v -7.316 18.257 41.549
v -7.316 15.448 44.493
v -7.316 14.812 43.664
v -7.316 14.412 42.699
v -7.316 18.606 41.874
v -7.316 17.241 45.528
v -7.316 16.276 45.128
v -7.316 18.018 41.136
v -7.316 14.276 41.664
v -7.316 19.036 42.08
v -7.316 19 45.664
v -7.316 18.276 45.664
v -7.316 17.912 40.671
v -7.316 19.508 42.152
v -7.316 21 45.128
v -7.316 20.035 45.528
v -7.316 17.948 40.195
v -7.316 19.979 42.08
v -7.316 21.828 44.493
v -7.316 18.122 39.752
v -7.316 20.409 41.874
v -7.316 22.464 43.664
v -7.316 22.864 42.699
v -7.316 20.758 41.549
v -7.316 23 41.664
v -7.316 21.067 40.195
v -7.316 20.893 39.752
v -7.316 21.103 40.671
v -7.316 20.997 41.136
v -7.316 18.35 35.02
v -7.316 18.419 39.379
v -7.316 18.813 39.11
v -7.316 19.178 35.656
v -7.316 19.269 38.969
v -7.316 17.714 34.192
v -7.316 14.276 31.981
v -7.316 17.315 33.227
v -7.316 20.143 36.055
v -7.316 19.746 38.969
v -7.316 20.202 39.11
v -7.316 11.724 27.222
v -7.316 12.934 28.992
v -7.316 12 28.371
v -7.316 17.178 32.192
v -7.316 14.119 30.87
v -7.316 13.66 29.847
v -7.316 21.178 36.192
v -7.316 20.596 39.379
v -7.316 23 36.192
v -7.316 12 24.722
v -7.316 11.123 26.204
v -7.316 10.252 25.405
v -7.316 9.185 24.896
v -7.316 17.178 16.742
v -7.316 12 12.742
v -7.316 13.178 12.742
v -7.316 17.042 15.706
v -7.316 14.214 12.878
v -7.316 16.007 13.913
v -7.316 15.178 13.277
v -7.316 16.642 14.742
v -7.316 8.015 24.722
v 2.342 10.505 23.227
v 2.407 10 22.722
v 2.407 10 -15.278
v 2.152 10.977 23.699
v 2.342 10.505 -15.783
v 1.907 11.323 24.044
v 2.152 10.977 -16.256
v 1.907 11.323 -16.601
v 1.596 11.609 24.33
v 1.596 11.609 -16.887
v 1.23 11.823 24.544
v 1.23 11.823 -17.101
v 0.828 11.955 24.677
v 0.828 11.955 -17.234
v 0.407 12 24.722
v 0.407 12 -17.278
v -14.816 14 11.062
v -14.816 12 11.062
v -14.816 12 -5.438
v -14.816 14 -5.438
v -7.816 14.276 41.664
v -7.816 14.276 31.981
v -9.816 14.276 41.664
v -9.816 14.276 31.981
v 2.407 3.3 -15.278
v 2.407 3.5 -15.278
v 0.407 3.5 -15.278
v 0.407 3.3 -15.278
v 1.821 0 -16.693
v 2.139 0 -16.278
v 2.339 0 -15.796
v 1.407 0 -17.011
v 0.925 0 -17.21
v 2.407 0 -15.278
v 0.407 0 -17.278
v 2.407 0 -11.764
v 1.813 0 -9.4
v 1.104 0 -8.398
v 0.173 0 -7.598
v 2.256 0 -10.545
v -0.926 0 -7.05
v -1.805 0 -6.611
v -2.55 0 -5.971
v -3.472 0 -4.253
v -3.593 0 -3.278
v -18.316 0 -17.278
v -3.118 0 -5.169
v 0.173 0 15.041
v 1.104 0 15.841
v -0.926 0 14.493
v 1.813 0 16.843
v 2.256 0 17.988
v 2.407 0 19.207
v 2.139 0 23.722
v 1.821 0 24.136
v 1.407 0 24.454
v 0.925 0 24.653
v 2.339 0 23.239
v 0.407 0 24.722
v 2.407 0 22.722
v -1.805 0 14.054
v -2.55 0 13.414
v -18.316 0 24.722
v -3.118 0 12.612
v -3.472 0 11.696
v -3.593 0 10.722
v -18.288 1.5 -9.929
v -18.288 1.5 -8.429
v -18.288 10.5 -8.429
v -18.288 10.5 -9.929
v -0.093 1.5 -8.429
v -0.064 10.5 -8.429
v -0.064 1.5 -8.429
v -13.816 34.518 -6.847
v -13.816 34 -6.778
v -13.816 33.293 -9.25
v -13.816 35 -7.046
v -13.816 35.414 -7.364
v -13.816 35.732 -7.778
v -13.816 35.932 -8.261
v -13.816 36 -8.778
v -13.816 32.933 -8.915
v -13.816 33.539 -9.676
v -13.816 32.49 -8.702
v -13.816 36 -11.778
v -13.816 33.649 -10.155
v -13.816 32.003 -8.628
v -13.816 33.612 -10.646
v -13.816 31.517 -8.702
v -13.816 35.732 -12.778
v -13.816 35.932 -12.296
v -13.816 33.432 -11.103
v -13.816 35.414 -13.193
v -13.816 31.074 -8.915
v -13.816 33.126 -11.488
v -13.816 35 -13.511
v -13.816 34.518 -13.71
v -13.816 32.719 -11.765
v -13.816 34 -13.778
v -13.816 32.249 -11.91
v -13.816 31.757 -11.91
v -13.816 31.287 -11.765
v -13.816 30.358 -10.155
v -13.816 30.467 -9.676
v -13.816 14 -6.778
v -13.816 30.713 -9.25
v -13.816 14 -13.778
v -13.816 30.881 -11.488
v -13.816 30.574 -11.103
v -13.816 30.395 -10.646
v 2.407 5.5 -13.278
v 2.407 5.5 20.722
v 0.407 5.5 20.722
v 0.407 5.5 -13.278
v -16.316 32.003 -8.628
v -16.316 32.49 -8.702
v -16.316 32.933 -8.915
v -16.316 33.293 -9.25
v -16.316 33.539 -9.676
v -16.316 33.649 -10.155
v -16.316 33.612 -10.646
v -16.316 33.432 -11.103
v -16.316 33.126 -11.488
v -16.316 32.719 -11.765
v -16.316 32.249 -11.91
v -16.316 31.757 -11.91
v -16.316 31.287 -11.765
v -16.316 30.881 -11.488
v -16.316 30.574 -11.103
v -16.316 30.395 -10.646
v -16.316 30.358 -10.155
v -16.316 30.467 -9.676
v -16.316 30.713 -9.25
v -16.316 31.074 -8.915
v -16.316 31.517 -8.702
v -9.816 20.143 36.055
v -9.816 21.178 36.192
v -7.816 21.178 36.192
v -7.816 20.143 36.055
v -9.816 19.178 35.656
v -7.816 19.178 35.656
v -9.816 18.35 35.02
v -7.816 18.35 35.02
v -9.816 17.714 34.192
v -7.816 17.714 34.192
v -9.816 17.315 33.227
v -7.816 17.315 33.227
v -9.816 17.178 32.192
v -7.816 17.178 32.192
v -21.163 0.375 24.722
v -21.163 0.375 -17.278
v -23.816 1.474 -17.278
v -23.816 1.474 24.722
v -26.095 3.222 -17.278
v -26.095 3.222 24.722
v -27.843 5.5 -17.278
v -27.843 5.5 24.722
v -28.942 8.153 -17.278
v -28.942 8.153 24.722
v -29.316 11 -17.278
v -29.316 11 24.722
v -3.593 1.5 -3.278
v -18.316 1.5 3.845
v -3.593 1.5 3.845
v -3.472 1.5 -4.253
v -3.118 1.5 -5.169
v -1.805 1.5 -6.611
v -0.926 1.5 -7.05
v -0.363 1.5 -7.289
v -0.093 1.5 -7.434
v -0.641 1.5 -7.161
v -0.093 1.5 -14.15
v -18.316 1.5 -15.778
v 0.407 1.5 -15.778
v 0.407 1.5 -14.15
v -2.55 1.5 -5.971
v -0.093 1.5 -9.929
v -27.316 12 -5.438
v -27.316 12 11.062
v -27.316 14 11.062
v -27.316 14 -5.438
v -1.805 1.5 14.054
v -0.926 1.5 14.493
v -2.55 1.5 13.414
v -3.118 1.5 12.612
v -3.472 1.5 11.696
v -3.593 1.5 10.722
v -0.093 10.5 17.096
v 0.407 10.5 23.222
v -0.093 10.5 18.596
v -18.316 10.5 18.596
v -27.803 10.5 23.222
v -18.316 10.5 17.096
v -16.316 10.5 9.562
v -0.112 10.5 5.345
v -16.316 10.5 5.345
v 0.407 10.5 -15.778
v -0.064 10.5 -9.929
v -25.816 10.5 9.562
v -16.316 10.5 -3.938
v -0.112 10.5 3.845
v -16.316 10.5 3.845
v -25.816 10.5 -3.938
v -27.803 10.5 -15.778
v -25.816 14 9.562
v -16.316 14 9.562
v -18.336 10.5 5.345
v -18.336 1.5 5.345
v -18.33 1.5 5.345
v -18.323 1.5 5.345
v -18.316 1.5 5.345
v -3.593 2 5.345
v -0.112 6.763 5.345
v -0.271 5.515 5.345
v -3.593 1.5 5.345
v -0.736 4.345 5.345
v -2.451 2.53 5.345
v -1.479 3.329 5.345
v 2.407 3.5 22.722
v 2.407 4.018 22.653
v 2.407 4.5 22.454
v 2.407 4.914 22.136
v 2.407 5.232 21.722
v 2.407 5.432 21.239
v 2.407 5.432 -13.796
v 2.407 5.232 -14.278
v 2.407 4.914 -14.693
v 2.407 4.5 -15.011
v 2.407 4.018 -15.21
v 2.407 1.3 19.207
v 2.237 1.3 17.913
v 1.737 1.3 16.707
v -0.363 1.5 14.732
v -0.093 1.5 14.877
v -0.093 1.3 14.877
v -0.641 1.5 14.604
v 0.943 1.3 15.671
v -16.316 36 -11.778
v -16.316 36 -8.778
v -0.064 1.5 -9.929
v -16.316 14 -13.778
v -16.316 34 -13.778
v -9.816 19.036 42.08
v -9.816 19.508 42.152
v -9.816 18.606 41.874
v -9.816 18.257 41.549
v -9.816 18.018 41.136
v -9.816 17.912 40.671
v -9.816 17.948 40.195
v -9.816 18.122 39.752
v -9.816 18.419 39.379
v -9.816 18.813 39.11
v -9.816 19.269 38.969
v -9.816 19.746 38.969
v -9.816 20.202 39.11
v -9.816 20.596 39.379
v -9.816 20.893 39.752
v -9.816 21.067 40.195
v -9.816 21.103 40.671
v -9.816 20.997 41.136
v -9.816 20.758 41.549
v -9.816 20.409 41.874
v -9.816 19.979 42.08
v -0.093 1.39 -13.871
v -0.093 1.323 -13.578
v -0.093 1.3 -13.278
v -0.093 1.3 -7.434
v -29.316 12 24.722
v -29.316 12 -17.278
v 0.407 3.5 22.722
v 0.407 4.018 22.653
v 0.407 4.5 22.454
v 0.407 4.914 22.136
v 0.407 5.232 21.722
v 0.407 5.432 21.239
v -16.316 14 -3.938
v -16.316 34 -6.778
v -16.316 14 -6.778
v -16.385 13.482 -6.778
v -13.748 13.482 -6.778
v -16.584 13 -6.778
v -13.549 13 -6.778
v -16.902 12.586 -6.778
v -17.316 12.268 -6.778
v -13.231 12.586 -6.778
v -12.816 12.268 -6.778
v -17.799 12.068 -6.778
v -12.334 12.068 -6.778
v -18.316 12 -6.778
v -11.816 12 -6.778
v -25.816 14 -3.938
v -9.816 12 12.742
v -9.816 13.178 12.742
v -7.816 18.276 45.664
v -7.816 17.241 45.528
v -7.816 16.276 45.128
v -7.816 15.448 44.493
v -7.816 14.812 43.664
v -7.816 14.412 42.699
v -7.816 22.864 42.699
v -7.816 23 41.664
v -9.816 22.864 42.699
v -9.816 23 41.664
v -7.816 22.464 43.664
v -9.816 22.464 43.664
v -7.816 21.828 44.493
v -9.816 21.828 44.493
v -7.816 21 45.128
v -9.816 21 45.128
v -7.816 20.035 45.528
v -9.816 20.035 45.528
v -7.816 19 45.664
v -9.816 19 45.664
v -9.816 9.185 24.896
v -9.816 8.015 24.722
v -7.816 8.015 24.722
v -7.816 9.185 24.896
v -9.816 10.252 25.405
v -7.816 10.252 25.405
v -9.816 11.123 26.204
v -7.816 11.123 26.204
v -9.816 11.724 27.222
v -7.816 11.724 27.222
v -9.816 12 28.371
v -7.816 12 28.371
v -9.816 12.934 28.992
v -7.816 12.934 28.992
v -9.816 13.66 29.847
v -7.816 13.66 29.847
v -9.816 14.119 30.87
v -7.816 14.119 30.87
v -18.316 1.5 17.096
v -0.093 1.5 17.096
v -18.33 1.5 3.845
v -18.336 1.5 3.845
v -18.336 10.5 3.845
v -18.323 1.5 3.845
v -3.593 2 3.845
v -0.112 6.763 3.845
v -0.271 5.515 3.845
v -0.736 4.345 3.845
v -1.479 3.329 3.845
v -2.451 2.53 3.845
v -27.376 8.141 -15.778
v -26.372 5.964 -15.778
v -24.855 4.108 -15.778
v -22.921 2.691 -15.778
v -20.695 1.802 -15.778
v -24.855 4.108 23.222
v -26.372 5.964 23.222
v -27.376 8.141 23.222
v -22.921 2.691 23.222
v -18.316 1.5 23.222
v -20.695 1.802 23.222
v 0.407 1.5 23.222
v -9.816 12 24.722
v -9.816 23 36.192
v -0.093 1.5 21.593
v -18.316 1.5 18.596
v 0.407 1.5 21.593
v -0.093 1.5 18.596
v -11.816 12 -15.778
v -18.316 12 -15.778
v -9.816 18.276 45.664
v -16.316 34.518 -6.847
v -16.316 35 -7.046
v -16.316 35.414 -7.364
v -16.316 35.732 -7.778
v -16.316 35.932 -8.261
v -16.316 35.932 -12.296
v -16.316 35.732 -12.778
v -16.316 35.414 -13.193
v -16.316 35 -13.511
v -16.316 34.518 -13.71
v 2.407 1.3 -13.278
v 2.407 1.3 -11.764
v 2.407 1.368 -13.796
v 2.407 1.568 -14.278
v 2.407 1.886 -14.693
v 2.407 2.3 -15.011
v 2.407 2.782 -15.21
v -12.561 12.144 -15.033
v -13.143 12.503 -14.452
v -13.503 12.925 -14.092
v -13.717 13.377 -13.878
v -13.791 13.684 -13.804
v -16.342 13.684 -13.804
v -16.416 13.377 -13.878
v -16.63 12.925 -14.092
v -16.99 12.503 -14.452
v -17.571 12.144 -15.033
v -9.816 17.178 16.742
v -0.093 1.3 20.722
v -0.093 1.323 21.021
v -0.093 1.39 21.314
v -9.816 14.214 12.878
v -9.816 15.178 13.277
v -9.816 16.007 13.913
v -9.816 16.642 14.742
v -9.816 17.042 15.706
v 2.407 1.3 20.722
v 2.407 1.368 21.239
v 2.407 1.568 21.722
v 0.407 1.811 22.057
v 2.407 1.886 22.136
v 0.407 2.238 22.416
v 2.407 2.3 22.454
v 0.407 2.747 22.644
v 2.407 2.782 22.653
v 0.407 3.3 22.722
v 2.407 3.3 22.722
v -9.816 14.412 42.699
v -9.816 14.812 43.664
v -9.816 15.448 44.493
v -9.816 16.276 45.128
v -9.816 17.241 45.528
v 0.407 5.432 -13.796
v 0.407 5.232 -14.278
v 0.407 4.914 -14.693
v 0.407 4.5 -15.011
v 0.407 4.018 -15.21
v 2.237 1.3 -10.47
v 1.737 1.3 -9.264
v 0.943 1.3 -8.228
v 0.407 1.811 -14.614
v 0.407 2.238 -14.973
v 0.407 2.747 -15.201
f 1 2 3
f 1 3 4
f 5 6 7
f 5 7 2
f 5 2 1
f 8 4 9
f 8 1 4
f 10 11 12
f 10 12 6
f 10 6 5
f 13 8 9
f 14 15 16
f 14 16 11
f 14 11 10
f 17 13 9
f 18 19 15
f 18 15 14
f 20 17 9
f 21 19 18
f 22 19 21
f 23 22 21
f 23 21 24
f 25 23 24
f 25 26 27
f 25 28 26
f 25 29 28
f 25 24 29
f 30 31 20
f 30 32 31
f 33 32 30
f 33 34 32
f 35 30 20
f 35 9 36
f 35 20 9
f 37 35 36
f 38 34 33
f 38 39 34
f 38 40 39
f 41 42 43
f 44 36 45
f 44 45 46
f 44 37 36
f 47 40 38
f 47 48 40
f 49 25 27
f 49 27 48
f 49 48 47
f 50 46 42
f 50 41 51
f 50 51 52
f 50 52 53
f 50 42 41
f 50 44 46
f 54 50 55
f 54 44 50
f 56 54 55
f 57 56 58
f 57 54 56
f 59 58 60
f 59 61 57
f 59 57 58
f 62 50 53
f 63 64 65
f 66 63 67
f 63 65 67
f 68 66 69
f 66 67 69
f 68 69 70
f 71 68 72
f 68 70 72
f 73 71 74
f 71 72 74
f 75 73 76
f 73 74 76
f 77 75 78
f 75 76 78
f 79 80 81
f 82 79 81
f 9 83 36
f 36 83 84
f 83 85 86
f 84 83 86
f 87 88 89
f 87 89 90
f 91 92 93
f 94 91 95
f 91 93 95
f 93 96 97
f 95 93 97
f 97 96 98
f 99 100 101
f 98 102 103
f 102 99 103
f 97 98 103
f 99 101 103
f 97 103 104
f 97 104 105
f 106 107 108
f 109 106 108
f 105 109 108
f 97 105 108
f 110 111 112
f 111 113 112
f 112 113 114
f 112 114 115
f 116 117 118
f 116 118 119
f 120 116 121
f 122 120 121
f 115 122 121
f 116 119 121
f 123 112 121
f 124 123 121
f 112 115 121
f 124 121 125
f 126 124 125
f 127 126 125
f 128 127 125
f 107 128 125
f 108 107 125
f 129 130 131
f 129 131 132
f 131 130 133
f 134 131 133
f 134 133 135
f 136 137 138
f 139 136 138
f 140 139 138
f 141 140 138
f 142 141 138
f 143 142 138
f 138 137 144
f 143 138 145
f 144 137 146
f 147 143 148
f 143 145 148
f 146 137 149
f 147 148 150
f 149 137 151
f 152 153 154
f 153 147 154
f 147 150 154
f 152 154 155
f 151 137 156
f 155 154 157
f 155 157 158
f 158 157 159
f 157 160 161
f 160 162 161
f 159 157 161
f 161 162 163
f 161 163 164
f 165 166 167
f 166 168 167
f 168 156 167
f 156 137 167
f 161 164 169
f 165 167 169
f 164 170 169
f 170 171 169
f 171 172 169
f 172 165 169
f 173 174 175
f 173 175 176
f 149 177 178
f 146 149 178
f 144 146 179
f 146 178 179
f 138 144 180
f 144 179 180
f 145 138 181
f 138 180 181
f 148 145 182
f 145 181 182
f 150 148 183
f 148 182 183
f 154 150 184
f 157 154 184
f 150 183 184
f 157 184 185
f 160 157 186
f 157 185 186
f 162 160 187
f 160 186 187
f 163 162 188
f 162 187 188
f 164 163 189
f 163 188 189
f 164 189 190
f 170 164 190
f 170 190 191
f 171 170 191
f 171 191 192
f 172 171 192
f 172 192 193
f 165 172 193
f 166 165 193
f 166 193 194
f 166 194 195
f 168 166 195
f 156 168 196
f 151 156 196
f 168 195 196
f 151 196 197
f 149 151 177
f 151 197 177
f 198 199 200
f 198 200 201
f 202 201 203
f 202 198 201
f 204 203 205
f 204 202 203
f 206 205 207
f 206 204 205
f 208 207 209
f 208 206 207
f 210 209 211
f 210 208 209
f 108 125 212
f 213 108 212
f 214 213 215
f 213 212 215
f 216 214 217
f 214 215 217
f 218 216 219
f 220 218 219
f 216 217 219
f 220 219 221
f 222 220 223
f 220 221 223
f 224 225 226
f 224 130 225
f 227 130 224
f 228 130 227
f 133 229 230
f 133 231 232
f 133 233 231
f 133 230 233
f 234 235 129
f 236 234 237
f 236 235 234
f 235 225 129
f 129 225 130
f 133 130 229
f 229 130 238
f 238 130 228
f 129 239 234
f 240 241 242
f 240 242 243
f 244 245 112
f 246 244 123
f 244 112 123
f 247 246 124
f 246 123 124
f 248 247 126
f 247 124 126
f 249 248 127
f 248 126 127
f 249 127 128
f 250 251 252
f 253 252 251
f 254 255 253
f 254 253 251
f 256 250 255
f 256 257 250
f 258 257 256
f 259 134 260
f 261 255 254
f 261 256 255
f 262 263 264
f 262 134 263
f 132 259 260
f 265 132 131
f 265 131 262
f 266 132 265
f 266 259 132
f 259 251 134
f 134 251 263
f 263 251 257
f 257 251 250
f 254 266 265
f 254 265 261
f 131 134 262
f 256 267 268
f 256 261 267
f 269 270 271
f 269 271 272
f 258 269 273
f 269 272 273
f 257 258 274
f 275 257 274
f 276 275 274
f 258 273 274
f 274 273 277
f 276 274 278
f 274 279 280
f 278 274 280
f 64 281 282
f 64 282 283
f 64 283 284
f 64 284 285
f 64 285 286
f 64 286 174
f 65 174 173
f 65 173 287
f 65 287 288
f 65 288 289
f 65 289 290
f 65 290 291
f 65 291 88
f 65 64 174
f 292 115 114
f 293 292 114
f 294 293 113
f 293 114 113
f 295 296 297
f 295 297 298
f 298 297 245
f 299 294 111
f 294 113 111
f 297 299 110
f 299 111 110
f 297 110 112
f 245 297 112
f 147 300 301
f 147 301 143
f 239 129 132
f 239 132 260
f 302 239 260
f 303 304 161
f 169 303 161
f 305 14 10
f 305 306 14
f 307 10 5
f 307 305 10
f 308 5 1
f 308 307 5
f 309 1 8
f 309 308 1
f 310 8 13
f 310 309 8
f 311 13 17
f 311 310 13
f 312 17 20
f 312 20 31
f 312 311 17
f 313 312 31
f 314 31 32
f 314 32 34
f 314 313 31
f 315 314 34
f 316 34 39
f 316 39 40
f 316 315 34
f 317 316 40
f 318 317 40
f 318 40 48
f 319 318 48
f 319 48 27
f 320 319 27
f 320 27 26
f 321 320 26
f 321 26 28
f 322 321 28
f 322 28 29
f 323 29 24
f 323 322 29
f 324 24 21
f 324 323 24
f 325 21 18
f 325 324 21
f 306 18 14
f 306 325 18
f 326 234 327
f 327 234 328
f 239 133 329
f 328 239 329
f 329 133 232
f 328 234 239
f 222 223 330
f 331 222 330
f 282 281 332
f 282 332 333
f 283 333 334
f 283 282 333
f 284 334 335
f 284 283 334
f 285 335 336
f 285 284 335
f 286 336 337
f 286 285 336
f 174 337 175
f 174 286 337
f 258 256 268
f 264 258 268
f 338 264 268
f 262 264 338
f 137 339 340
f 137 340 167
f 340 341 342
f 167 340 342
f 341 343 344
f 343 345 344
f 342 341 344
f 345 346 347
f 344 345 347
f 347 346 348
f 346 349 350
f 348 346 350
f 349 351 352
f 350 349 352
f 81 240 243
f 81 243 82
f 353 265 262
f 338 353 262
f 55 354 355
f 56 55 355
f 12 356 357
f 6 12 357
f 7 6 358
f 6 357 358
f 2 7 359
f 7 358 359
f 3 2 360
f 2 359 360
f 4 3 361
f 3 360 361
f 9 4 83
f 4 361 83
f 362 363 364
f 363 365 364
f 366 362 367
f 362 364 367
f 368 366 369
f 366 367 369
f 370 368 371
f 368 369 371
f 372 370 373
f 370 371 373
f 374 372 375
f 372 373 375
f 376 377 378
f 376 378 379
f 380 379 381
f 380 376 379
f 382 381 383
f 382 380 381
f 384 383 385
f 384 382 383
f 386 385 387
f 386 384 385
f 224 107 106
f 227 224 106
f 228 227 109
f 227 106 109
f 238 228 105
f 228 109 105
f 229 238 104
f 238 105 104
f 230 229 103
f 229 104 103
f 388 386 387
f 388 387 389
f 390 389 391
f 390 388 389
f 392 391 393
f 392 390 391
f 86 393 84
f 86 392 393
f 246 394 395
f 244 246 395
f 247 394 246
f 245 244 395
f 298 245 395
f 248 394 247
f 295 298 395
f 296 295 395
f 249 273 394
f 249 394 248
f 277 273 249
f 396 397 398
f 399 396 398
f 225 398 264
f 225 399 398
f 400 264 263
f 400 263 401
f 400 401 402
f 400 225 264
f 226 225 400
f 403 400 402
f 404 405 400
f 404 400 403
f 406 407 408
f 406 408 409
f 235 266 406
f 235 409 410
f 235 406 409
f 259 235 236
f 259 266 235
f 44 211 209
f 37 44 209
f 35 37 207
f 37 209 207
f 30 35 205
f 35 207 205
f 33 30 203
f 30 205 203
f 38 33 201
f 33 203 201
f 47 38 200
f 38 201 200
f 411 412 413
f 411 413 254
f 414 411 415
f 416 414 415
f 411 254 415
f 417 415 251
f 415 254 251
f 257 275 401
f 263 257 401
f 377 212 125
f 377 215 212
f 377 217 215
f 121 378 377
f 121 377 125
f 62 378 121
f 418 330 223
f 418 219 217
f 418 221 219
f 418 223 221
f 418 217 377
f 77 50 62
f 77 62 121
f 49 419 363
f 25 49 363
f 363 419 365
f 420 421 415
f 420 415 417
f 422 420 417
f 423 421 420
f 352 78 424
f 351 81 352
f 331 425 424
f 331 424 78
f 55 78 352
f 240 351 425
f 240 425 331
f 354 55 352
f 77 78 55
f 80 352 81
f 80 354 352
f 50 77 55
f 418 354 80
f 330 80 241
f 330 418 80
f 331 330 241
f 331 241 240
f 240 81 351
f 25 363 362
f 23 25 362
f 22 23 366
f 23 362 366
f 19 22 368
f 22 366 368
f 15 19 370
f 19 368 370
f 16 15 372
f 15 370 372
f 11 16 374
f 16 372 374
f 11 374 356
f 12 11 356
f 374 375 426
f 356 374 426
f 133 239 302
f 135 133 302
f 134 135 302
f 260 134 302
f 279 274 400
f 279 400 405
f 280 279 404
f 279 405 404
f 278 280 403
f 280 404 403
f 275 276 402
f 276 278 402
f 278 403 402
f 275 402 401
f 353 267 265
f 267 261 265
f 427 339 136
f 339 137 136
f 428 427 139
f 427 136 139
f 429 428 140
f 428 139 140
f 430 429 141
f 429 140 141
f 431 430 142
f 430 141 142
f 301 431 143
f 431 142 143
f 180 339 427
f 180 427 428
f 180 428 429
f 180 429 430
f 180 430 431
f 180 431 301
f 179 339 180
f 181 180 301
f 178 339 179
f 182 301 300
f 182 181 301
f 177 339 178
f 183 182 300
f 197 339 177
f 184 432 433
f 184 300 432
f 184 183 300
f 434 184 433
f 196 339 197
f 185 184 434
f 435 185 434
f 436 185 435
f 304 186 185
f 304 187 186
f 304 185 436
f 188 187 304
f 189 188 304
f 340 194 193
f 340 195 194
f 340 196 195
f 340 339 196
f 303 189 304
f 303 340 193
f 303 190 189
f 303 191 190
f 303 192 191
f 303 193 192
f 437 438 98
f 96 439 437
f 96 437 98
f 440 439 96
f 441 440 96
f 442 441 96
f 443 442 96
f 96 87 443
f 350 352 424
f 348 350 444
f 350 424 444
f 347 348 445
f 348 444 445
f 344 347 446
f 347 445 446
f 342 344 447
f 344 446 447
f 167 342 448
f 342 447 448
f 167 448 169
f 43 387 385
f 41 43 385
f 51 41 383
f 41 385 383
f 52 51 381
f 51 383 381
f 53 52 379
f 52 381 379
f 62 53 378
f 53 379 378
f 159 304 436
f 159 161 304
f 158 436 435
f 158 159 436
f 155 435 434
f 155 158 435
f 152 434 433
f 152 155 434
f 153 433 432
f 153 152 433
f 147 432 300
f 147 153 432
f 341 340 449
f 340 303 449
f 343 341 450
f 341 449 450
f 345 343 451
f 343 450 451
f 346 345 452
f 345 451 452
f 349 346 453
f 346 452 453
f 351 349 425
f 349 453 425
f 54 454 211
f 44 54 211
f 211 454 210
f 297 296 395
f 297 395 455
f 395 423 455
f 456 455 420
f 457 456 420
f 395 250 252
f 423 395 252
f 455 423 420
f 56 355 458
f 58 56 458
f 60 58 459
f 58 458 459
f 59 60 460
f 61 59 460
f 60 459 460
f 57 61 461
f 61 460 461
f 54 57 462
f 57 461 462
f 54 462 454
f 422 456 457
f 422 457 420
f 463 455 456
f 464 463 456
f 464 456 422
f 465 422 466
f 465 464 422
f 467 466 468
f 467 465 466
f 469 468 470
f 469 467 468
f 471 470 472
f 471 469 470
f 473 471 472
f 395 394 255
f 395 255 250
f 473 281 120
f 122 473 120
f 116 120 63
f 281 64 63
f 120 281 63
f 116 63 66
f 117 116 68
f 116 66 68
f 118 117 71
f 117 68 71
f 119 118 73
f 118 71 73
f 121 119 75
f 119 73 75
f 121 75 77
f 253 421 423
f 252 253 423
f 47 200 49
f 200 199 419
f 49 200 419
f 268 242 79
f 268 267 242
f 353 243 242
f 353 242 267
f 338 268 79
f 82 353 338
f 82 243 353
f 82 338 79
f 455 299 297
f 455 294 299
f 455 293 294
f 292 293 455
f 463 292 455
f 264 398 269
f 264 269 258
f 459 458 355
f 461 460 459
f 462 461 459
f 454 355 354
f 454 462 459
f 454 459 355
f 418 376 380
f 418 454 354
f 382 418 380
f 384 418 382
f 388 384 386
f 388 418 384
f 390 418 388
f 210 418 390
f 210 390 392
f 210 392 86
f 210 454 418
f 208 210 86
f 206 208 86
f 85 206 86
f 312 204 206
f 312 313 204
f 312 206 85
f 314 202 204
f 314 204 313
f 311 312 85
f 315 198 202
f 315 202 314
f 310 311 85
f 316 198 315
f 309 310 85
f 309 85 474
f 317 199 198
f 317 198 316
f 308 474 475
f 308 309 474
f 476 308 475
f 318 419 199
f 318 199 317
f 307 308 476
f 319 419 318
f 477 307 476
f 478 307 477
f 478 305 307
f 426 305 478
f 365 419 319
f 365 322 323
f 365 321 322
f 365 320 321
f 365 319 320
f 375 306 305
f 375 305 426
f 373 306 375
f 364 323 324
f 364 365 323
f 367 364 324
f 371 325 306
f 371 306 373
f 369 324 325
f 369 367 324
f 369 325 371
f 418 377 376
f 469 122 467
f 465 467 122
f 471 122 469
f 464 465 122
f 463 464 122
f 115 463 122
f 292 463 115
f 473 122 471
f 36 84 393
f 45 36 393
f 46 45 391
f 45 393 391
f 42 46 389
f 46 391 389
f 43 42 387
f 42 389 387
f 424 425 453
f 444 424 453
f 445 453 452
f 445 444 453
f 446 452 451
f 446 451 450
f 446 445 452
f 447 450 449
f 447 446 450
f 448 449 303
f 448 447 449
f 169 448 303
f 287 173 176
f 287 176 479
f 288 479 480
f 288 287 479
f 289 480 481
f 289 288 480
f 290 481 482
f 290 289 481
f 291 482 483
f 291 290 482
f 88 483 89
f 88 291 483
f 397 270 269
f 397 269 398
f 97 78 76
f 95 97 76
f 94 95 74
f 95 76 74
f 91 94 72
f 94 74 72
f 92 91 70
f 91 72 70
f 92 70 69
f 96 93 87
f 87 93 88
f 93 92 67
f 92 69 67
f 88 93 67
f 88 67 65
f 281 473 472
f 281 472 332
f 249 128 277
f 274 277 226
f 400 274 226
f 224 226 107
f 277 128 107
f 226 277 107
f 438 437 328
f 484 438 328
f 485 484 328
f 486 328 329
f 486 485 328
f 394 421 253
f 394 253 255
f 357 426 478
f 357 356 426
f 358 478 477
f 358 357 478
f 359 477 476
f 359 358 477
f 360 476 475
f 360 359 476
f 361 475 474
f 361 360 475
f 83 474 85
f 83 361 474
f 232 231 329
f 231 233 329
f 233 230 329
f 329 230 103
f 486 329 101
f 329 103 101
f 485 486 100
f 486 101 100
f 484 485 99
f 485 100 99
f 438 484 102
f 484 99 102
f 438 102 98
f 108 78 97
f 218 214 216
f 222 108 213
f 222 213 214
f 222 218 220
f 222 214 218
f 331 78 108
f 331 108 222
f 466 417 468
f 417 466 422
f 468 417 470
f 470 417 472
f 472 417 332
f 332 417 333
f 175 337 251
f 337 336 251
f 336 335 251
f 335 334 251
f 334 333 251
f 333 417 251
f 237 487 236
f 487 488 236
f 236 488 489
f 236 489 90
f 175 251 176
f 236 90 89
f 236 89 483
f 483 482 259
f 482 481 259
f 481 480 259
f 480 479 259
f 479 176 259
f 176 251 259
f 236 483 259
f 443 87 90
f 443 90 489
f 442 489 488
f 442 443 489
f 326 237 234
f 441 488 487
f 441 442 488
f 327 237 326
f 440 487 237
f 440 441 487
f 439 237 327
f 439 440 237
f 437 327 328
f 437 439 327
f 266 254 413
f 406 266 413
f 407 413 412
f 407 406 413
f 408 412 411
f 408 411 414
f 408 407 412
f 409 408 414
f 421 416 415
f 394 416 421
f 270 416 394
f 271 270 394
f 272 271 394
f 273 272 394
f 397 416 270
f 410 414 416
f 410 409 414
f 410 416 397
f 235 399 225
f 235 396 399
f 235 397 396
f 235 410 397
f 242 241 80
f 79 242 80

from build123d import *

# Parameters (mm, degrees)
SALIENTE_EXTRUIR1_DEPTH  = 12
CROQUIS2_W               = 12.5
CROQUIS2_H               = 16.5
CROQUIS2_W_2             = 9.5
CROQUIS2_H_2             = 13.5
SALIENTE_EXTRUIR2_DEPTH  = 2
SALIENTE_EXTRUIR4_DEPTH  = 11
CROQUIS4_R               = 1.6
CORTAR_EXTRUIR1_DEPTH    = 2.5
CROQUIS5_W               = 17.29289048
CROQUIS5_H               = 2.276098228
CROQUIS5_W_2             = 23.449996424
CROQUIS5_H_2             = 5.821617307
CORTAR_EXTRUIR2_DEPTH    = 2
SALIENTE_EXTRUIR5_DEPTH  = 3
CROQUIS7_W               = 60
CROQUIS7_H               = 12
SALIENTE_EXTRUIR6_DEPTH  = 3
CORTAR_EXTRUIR3_DEPTH    = 42
VACIADO4_START           = -15.778481013
VACIADO4_DEPTH           = 39
VACIADO4_2_OUTLINE_W     = 28
VACIADO4_2_OUTLINE_H     = 9
VACIADO4_2_DEPTH         = 4
VACIADO4_START_2         = 19.221518987
VACIADO4_3_OUTLINE_W     = 28
VACIADO4_3_OUTLINE_H     = 9
VACIADO4_3_DEPTH         = 4
VACIADO4_START_3         = -3.938481013
VACIADO4_4_OUTLINE_W     = 9.5
VACIADO4_4_OUTLINE_H     = 1.5
VACIADO4_4_DEPTH         = 13.5
REDONDEO2_R              = 4
REDONDEO3_R              = 4
CROQUIS10_W              = 2.5
CROQUIS10_H              = 7
SALIENTE_EXTRUIR8_DEPTH  = 24
CROQUIS11_R              = 1.65
CORTAR_EXTRUIR4_DEPTH    = 2.5
CROQUIS14_R              = 1.6
SALIENTE_EXTRUIR10_DEPTH = 0.5
CROQUIS15_W              = 28.276285021
CROQUIS15_H              = 42
CORTAR_EXTRUIR5_DEPTH    = 12
CROQUIS16_W              = 42
CROQUIS16_H              = 12
SALIENTE_EXTRUIR11_DEPTH = 2
CORTAR_EXTRUIR6_DEPTH    = 2.5
CROQUIS19_W              = 18.223714979
CROQUIS19_H              = 1.5
SALIENTE_EXTRUIR16_DEPTH = 9
REDONDEO4_R              = 2
REDONDEO5_R              = 2
REDONDEO6_R              = 2
CORTAR_EXTRUIR7_DEPTH    = 2
REDONDEO7_R              = 5
REDONDEO8_R              = 5


with BuildPart() as part:
    # Croquis1 → Saliente-Extruir1 (new body)
    with BuildSketch(Plane(origin=(0, 0, 0), x_dir=(1, 0, 0), z_dir=(0, 1, 0))):
        Polygon((30.683544304, -17.721518987), (30.683544304, -21.721518987), (-29.316455696, -21.721518987), (-29.316455696, 14.278481013), (30.683544304, 14.278481013), (30.683544304, 10.278481013), (2.683544304, 10.278481013), (2.683544304, -17.721518987), align=None)
    extrude(amount=SALIENTE_EXTRUIR1_DEPTH)

    # Croquis2 → Saliente-Extruir2 (add)
    with BuildSketch(Plane(origin=(0, 12, 0), x_dir=(1, 0, 0), z_dir=(0, 1, 0))):
        with Locations((-21.066455696, -2.811518987)):
            Rectangle(CROQUIS2_W, CROQUIS2_H)
        with Locations((-21.066455696, -2.811518987)):
            Rectangle(CROQUIS2_W_2, CROQUIS2_H_2, mode=Mode.SUBTRACT)
    extrude(amount=SALIENTE_EXTRUIR2_DEPTH)

    # Croquis3 → Saliente-Extruir4 (add)
    with BuildSketch(Plane(origin=(0, 12, 0), x_dir=(1, 0, 0), z_dir=(0, 1, 0))):
        Polygon((-7.816455696, -12.741518987), (-7.816455696, -41.560532566), (-7.816455696, -45.664219129), (-9.816455696, -45.664219129), (-9.816455696, -41.560532566), (-9.816455696, -12.741518987), align=None)
    extrude(amount=SALIENTE_EXTRUIR4_DEPTH)

    # Croquis4 → Cortar-Extruir1 (cut)
    with BuildSketch(Plane.ZY.offset(9.816455696)):
        with Locations((40.551518987, 19.507537468)):
            Circle(CROQUIS4_R)
    extrude(amount=-CORTAR_EXTRUIR1_DEPTH, mode=Mode.SUBTRACT)

    # Croquis5 → Cortar-Extruir2 (cut)
    with BuildSketch(Plane.ZY.offset(9.816455696)):
        with Locations((37.017773889, 13.138049114)):
            Rectangle(CROQUIS5_W, CROQUIS5_H)
        with Locations((24.466517199, 20.089191347)):
            Rectangle(CROQUIS5_W_2, CROQUIS5_H_2)
    extrude(amount=-CORTAR_EXTRUIR2_DEPTH, mode=Mode.SUBTRACT)

    # Croquis6 → Saliente-Extruir5 (add)
    with BuildSketch(Plane.XY.offset(21.721518987)):
        Polygon((-29.316455696, 0), (30.683544304, 0), (30.683544304, 12), (-7.816455696, 12), (-9.816455696, 12), (-29.316455696, 12), align=None)
    extrude(amount=SALIENTE_EXTRUIR5_DEPTH)

    # Croquis7 → Saliente-Extruir6 (add)
    with BuildSketch(Plane(origin=(0, 0, -14.278481013), x_dir=(-1, 0, 0), z_dir=(0, 0, -1))):
        with Locations((-0.683544304, 6)):
            Rectangle(CROQUIS7_W, CROQUIS7_H)
    extrude(amount=SALIENTE_EXTRUIR6_DEPTH)

    # Croquis8 → Cortar-Extruir3 (cut)
    with BuildSketch(Plane.XY.offset(24.721518987)):
        with BuildLine():
            Line((-29.316455696, 0), (-18.316455696, 0))
            ThreePointArc((-18.316455696, 0), (-26.094630289, 3.221825407), (-29.316455696, 11))
            Line((-29.316455696, 11), (-29.316455696, 0))
        make_face()
    extrude(amount=-CORTAR_EXTRUIR3_DEPTH, mode=Mode.SUBTRACT)

    # Vaciado4: read off the stored shape, not the designer's step
    # Vaciado4 outline → Vaciado4 (cut)
    with BuildSketch(Plane.XY.offset(VACIADO4_START)):
        with BuildLine():
            Line((1.183544304, 10.5), (-27.803288677, 10.5))
            ThreePointArc((-27.803288677, 10.5), (-24.854804112, 4.107975624), (-18.316455696, 1.5))
            Line((-18.316455696, 1.5), (1.183544304, 1.5))
            Line((1.183544304, 1.5), (1.183544304, 10.5))
        make_face()
    extrude(amount=VACIADO4_DEPTH, mode=Mode.SUBTRACT)

    # Vaciado4 2 outline → Vaciado4 2 (cut)
    with BuildSketch(Plane.XY.offset(VACIADO4_START)):
        with Locations((15.183544304, 6)):
            Rectangle(VACIADO4_2_OUTLINE_W, VACIADO4_2_OUTLINE_H)
    extrude(amount=VACIADO4_2_DEPTH, mode=Mode.SUBTRACT)

    # Vaciado4 3 outline → Vaciado4 3 (cut)
    with BuildSketch(Plane.XY.offset(VACIADO4_START_2)):
        with Locations((15.183544304, 6)):
            Rectangle(VACIADO4_3_OUTLINE_W, VACIADO4_3_OUTLINE_H)
    extrude(amount=VACIADO4_3_DEPTH, mode=Mode.SUBTRACT)

    # Vaciado4 4 outline → Vaciado4 4 (cut)
    with BuildSketch(Plane.XY.offset(VACIADO4_START_3)):
        with Locations((-21.066455696, 11.25)):
            Rectangle(VACIADO4_4_OUTLINE_W, VACIADO4_4_OUTLINE_H)
    extrude(amount=VACIADO4_4_DEPTH, mode=Mode.SUBTRACT)

    # Redondeo2
    # the kernel refuses this fillet: 4 mm, written as the material it adds along each edge
    with BuildSketch(Plane(origin=(-9.816455696, 12, 24.721518987), x_dir=(0, -1, 0), z_dir=(1, 0, 0))) as redondeo2_piece_1:
        with BuildLine():
            CenterArc((3.984641355, -4), REDONDEO2_R, 90, 84.977462971)
            Line((0, -3.649809662), (0, 0))
            Line((0, 0), (3.984641355, 0))
        make_face()
    extrude(amount=2)
    with BuildSketch(Plane(origin=(-9.816455696, 14.276098228, 28.371328649), x_dir=(0, 0, 1), z_dir=(1, 0, 0))) as redondeo2_piece_2:
        with BuildLine():
            CenterArc((3.609454623, 4), REDONDEO2_R, 205.52948015, 64.47051985)
            Line((0, 2.276098228), (0, 0))
            Line((0, 0), (3.609454623, 0))
        make_face()
    extrude(amount=2)
    with BuildSketch(Plane(origin=(-9.816455696, 17.178382693, 36.191515411), x_dir=(0, 0, -1), z_dir=(1, 0, 0))) as redondeo2_piece_3:
        with BuildLine():
            CenterArc((REDONDEO2_R, REDONDEO2_R), REDONDEO2_R, 180, 90)
            Line((0, REDONDEO2_R), (0, 0))
            Line((0, 0), (REDONDEO2_R, 0))
        make_face()
    extrude(amount=2)
    # the kernel refuses this fillet: 4 mm, written as the material it takes off along each edge
    with BuildSketch(Plane(origin=(-19.816455696, 17.178382693, 12.741518987), x_dir=(0, 0, 1), z_dir=(1, 0, 0))) as redondeo2_2_piece_1:
        with BuildLine():
            CenterArc((REDONDEO2_R, REDONDEO2_R), REDONDEO2_R, 180, 90)
            Line((0, REDONDEO2_R), (0, 0))
            Line((0, 0), (REDONDEO2_R, 0))
        make_face()
    extrude(amount=22, mode=Mode.SUBTRACT)

    # Redondeo3
    redondeo3_edges = [part.edges().sort_by_distance(p)[0] for p in [
        (-8.816455696, 23, 45.664219129),
        (-8.816455696, 14.276098228, 45.664219129),
    ]]
    fillet(redondeo3_edges, radius=REDONDEO3_R)

    # Croquis10 → Saliente-Extruir8 (add)
    with BuildSketch(Plane(origin=(0, 12, 0), x_dir=(1, 0, 0), z_dir=(0, 1, 0))):
        with Locations((-15.066455696, 10.278481013)):
            Rectangle(CROQUIS10_W, CROQUIS10_H)
    extrude(amount=SALIENTE_EXTRUIR8_DEPTH)

    # Croquis11 → Cortar-Extruir4 (cut)
    with BuildSketch(Plane.ZY.offset(16.316455696)):
        with Locations((-10.278481013, 32.003262859)):
            Circle(CROQUIS11_R)
    extrude(amount=-CORTAR_EXTRUIR4_DEPTH, mode=Mode.SUBTRACT)

    # Croquis14 → Saliente-Extruir10 (add)
    with BuildSketch(Plane(origin=(-7.816455696, 0, 0), x_dir=(0, 0, -1), z_dir=(1, 0, 0))):
        with BuildLine():
            Line((-36.191515411, 23), (-41.664219129, 23))
            ThreePointArc((-41.664219129, 23), (-44.492646254, 21.828427125), (-45.664219129, 19))
            Line((-45.664219129, 19), (-45.664219129, 18.276098228))
            ThreePointArc((-45.664219129, 18.276098228), (-44.492646254, 15.447671103), (-41.664219129, 14.276098228))
            Line((-41.664219129, 14.276098228), (-31.980783273, 14.276098228))
            ThreePointArc((-31.980783273, 14.276098228), (-29.847195577, 13.659558519), (-28.371328649, 12))
            ThreePointArc((-28.371328649, 12), (-25.771878217, 10.717139414), (-24.721518987, 8.015358645))
            Line((-24.721518987, 8.015358645), (-24.721518987, 12))
            Line((-24.721518987, 12), (-12.741518987, 12))
            Line((-12.741518987, 12), (-12.741518987, 13.178382693))
            ThreePointArc((-12.741518987, 13.178382693), (-13.913091863, 16.006809817), (-16.741518987, 17.178382693))
            Line((-16.741518987, 17.178382693), (-32.191515411, 17.178382693))
            ThreePointArc((-32.191515411, 17.178382693), (-35.019942535, 18.349955568), (-36.191515411, 21.178382693))
            Line((-36.191515411, 21.178382693), (-36.191515411, 23))
        make_face()
        with Locations(Location((-40.551518987, 19.507537468, 0), (0, 0, 180))):
            Circle(CROQUIS14_R, mode=Mode.SUBTRACT)
    extrude(amount=SALIENTE_EXTRUIR10_DEPTH)

    # Croquis15 → Cortar-Extruir5 (cut)
    with BuildSketch(Plane(origin=(0, 12, 0), x_dir=(1, 0, 0), z_dir=(0, 1, 0))):
        with Locations((16.545401794, -3.721518987)):
            Rectangle(CROQUIS15_W, CROQUIS15_H)
    extrude(amount=-CORTAR_EXTRUIR5_DEPTH, mode=Mode.SUBTRACT)

    # Croquis16 → Saliente-Extruir11 (add)
    with BuildSketch(Plane(origin=(2.407259283, 0, 0), x_dir=(0, 0, -1), z_dir=(1, 0, 0))):
        with Locations((-3.721518987, 6)):
            Rectangle(CROQUIS16_W, CROQUIS16_H)
    extrude(amount=-SALIENTE_EXTRUIR11_DEPTH)

    # Croquis18 → Cortar-Extruir6 (cut)
    with BuildSketch(Plane(origin=(2.407259283, 0, 0), x_dir=(0, 0, -1), z_dir=(1, 0, 0))):
        with BuildLine():
            Line((-20.721518987, 5.5), (13.278481013, 5.5))
            ThreePointArc((13.278481013, 5.5), (14.692694575, 4.914213562), (15.278481013, 3.5))
            Line((15.278481013, 3.5), (15.278481013, 3.3))
            ThreePointArc((15.278481013, 3.3), (14.692694575, 1.885786438), (13.278481013, 1.3))
            Line((13.278481013, 1.3), (-20.721518987, 1.3))
            ThreePointArc((-20.721518987, 1.3), (-22.13573255, 1.885786438), (-22.721518987, 3.3))
            Line((-22.721518987, 3.3), (-22.721518987, 3.5))
            ThreePointArc((-22.721518987, 3.5), (-22.13573255, 4.914213562), (-20.721518987, 5.5))
        make_face()
    extrude(amount=-CORTAR_EXTRUIR6_DEPTH, mode=Mode.SUBTRACT)

    # Croquis19 → Saliente-Extruir16 (add)
    with BuildSketch(Plane(origin=(0, 1.5, 0), x_dir=(1, 0, 0), z_dir=(0, 1, 0))):
        with Locations((-9.204598207, -17.846071371)):
            Rectangle(CROQUIS19_W, CROQUIS19_H)
        with Locations((-9.224216979, -4.59531752)):
            Rectangle(CROQUIS19_W, CROQUIS19_H)
        with Locations((-9.175696895, 9.179239743)):
            Rectangle(CROQUIS19_W, CROQUIS19_H)
    extrude(amount=SALIENTE_EXTRUIR16_DEPTH)

    # Redondeo4
    # the kernel refuses this fillet: 2 mm, written as the material it takes off along each edge
    with BuildSketch(Plane(origin=(2.407259283, 12, -22.278481013), x_dir=(-1, 0, 0), z_dir=(0, 0, 1))) as redondeo4_piece_1:
        with BuildLine():
            CenterArc((REDONDEO4_R, REDONDEO4_R), REDONDEO4_R, 180, 90)
            Line((0, REDONDEO4_R), (0, 0))
            Line((0, 0), (REDONDEO4_R, 0))
        make_face()
    extrude(amount=52, mode=Mode.SUBTRACT)
    with BuildSketch(Plane(origin=(2.407259283, 17, 24.721518987), x_dir=(-1, 0, 0), z_dir=(0, -1, 0)), Plane(origin=(2.407259283, 17, -17.278481013), x_dir=(0, 0, 1), z_dir=(0, -1, 0))) as redondeo4_piece_2:
        with BuildLine():
            CenterArc((REDONDEO4_R, REDONDEO4_R), REDONDEO4_R, 180, 90)
            Line((0, REDONDEO4_R), (0, 0))
            Line((0, 0), (REDONDEO4_R, 0))
        make_face()
    extrude(amount=22, mode=Mode.SUBTRACT)

    # Redondeo5
    redondeo5_edges = [part.edges().sort_by_distance(p)[0] for p in [
        (-15.066455696, 36, -13.778481013),
        (-15.066455696, 36, -6.778481013),
    ]]
    fillet(redondeo5_edges, radius=REDONDEO5_R)

    # Redondeo6
    redondeo6_edges = [part.edges().sort_by_distance(p)[0] for p in [
        (-13.816455696, 12, -10.278481013),
        (-15.066455696, 12, -13.778481013),
        (-16.316455696, 12, -10.278481013),
    ]]
    fillet(redondeo6_edges, radius=REDONDEO6_R)

    # Croquis20 → Cortar-Extruir7 (cut)
    with BuildSketch(Plane.XZ):
        with BuildLine():
            Line((2.407259283, 14.721518987), (0.407259283, 14.721518987))
            ThreePointArc((0.407259283, 14.721518987), (-2.421167842, 13.549946112), (-3.592740717, 10.721518987))
            Line((-3.592740717, 10.721518987), (-3.592740717, -3.278481013))
            ThreePointArc((-3.592740717, -3.278481013), (-2.421167842, -6.106908137), (0.407259283, -7.278481013))
            Line((0.407259283, -7.278481013), (2.407259283, -7.278481013))
            Line((2.407259283, -7.278481013), (2.407259283, 14.721518987))
        make_face()
    extrude(amount=-CORTAR_EXTRUIR7_DEPTH, mode=Mode.SUBTRACT)

    # Redondeo7
    # the kernel refuses this fillet: 5 mm, written as the material it takes off along each edge
    with BuildSketch(Plane(origin=(2.407259283, -11.213203436, -7.278481013), x_dir=(-0.9976533062578327, 0, 0.06846809850445046), z_dir=(0, 1, 0))) as redondeo7_piece_1_section:
        with BuildLine():
            CenterArc((4.681167844, -4.817096285), REDONDEO7_R, 105.545216035, 70.528779366)
            Line((-0.307098687, -4.474755793), (-0.80592534, -4.440521743))
            Line((-0.80592534, -4.440521743), (-0.498826653, 0.034234049))
            Line((-0.498826653, 0.034234049), (0.034234049, 0.498826653))
            ThreePointArc((0.034234049, 0.498826653), (2.029540662, 0.361890456), (3.207174666, 0.481709629))
            Line((3.207174666, 0.481709629), (3.341174046, 0))
        make_face()
    redondeo7_piece_1 = extrude(amount=23.726406871, mode=Mode.PRIVATE)
    redondeo7_piece_1 = split(redondeo7_piece_1, bisect_by=Plane(origin=(2.407259283, 1.5, -7.278481013), z_dir=(0, -1, 0)), keep=Keep.TOP, mode=Mode.PRIVATE)
    add(redondeo7_piece_1, mode=Mode.SUBTRACT)
    with BuildSketch(Plane(origin=(2.407259283, -11.213203436, 14.721518987), x_dir=(0, 0, 1), z_dir=(0, 1, 0))) as redondeo7_piece_2_section:
        with BuildLine():
            CenterArc((4.485281374, -5), REDONDEO7_R, 90, 70.528779366)
            Line((-0.228763834, -3.333333333), (-0.700168354, -3.166666667))
            ThreePointArc((-0.700168354, -3.166666667), (-0.5, -2), (-0.5, 0))
            Line((-0.5, 0), (0, 0.5))
            Line((0, 0.5), (4.485281374, 0.5))
            Line((4.485281374, 0.5), (4.485281374, 0))
        make_face()
    redondeo7_piece_2 = extrude(amount=23.726406871, mode=Mode.PRIVATE)
    redondeo7_piece_2 = split(redondeo7_piece_2, bisect_by=Plane(origin=(2.407259283, 1.5, 14.721518987), z_dir=(0, -1, 0)), keep=Keep.TOP, mode=Mode.PRIVATE)
    add(redondeo7_piece_2, mode=Mode.SUBTRACT)

    # Redondeo8
    # the kernel refuses this fillet: 5 mm, written as the material it takes off along each edge
    with BuildSketch(Plane(origin=(-0.11235949, 2, -8.063386961), x_dir=(-1, 0, 0), z_dir=(0, 0, 1))) as redondeo8_piece_1_section:
        with BuildLine():
            CenterArc((5, -4.763481792), REDONDEO8_R, 107.693426123, 72.306573877)
            Line((0, -4.763481792), (0, 0))
            Line((0, 0), (3.480381227, 0))
        make_face()
    redondeo8_piece_1 = extrude(amount=25.317408961, mode=Mode.PRIVATE)
    redondeo8_piece_1 = split(redondeo8_piece_1, bisect_by=Plane(origin=(-0.11235949, 2, 17.096071371), z_dir=(0, 0, -1)), keep=Keep.TOP, mode=Mode.PRIVATE)
    add(redondeo8_piece_1, mode=Mode.SUBTRACT)


solid = part.part
